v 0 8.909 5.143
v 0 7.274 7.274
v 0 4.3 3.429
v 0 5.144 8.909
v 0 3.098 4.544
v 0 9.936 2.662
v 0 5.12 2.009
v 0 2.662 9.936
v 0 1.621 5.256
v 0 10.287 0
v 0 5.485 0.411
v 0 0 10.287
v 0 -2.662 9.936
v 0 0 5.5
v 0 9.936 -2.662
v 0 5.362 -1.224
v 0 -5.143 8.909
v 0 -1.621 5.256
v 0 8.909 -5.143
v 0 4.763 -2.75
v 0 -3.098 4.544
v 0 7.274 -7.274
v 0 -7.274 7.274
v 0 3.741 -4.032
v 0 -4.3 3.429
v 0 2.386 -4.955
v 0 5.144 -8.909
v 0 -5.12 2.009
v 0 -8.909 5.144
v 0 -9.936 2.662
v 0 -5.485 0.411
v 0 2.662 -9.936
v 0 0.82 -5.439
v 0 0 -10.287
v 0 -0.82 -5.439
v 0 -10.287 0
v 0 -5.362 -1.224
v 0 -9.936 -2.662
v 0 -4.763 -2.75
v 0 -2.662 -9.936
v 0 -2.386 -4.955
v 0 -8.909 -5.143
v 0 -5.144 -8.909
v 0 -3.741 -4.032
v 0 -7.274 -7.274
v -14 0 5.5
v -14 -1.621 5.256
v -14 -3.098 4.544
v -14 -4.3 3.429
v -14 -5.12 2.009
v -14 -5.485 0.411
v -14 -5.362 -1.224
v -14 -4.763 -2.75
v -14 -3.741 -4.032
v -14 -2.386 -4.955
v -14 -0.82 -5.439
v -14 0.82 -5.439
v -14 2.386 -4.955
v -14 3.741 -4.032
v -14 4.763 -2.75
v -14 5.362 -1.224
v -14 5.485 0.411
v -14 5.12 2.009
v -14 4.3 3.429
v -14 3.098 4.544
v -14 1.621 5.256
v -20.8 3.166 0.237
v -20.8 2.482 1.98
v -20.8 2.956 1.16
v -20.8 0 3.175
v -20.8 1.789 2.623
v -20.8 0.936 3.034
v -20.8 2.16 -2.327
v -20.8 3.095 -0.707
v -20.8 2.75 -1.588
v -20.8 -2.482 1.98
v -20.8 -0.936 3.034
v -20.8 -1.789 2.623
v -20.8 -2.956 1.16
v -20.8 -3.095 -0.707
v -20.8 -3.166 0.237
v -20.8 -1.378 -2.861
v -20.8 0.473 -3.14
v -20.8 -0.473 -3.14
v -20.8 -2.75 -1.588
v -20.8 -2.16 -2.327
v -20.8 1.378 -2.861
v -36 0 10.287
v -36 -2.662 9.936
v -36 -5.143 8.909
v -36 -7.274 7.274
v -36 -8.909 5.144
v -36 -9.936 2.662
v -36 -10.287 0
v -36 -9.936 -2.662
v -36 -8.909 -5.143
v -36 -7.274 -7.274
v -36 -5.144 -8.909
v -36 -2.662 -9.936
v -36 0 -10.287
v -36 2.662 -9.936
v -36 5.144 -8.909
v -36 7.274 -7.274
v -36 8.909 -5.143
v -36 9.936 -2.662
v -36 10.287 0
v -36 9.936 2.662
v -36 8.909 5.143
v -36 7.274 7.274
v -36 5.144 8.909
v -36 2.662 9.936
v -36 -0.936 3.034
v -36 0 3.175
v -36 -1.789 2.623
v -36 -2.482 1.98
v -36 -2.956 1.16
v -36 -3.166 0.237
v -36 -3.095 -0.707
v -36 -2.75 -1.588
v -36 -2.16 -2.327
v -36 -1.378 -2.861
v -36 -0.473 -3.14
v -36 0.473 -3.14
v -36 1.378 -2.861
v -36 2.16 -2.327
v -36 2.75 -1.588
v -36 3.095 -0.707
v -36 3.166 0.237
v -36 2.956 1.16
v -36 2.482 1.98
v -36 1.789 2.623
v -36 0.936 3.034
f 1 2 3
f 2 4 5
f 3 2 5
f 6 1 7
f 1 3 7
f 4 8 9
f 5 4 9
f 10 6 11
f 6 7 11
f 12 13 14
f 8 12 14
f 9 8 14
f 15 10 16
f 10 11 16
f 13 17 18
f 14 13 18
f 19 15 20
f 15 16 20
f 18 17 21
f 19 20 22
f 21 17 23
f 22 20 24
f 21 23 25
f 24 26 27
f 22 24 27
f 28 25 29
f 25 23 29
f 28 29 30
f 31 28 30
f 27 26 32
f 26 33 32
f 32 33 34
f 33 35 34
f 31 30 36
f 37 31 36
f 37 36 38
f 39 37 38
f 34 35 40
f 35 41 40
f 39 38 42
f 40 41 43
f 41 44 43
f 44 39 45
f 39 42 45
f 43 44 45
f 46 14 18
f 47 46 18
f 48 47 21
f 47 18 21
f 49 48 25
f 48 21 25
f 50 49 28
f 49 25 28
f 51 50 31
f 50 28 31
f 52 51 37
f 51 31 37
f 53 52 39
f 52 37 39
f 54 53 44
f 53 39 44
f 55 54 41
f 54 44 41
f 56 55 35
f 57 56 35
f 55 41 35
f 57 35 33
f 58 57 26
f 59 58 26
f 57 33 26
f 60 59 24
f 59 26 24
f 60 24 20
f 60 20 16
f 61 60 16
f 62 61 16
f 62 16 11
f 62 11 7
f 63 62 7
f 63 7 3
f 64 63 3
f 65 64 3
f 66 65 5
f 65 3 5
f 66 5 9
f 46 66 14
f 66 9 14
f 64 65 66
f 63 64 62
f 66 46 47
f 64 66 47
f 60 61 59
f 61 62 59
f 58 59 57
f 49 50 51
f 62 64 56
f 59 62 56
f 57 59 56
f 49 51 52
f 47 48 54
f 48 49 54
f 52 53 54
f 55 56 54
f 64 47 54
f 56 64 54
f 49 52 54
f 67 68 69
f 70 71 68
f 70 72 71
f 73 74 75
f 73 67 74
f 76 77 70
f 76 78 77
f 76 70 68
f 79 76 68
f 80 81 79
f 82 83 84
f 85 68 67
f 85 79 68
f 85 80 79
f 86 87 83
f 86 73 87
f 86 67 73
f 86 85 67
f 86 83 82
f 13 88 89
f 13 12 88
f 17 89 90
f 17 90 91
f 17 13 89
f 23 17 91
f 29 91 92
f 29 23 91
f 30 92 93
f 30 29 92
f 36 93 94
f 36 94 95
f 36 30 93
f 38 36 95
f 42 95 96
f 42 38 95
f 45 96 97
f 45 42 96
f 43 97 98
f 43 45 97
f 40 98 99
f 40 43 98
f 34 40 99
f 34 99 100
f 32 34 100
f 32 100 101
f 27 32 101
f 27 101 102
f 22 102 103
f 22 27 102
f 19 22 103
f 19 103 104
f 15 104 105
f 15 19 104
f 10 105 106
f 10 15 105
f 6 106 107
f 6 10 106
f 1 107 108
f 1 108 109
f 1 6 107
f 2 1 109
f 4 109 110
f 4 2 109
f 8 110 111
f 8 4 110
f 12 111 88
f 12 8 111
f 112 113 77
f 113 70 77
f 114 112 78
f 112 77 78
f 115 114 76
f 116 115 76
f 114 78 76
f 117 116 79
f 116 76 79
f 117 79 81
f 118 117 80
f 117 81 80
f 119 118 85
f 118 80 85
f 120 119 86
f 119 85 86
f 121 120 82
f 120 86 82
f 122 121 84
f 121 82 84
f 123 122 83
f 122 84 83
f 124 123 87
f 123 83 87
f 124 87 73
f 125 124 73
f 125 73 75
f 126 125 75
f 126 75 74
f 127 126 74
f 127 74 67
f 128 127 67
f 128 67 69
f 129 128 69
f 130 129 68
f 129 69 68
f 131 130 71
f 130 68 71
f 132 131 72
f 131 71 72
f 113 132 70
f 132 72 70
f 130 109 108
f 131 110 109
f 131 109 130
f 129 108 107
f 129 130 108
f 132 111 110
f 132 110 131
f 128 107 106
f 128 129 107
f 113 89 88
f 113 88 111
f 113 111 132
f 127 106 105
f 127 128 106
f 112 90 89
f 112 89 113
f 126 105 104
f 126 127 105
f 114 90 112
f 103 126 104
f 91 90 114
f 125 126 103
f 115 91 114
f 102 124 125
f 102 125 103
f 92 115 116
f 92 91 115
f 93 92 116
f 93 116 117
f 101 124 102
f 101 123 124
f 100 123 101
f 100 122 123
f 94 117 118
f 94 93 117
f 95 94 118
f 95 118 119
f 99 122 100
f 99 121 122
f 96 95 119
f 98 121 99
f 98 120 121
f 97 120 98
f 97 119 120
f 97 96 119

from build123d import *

# Parameters (mm, degrees)
CONN_T4_FNPT_SKETCH_W = 36
CONN_T4_FNPT_SKETCH_H = 10.287
SOCKET_1_SKETCH_W     = 15
SOCKET_1_SKETCH_H     = 5.5
SOCKET_2_SKETCH_W     = 16.2
SOCKET_2_SKETCH_H     = 3.175


with BuildPart() as part:
    # Conn_T4_FNPT Sketch → Conn_T4_FNPT (revolve)
    with BuildSketch(Plane.XY):
        with Locations((-18, 5.1435)):
            Rectangle(CONN_T4_FNPT_SKETCH_W, CONN_T4_FNPT_SKETCH_H)
    revolve(axis=Axis((-1000, 0, 0), (1, 0, 0)))

    # Socket 1 Sketch → Socket 1 (revolve, cut)
    with BuildSketch(Plane.XY):
        with Locations((-6.5, 2.75)):
            Rectangle(SOCKET_1_SKETCH_W, SOCKET_1_SKETCH_H)
    revolve(axis=Axis((-1000, 0, 0), (1, 0, 0)), mode=Mode.SUBTRACT)

    # Socket 2 Sketch → Socket 2 (revolve, cut)
    with BuildSketch(Plane.XY):
        with Locations((-28.9, 1.5875)):
            Rectangle(SOCKET_2_SKETCH_W, SOCKET_2_SKETCH_H)
    revolve(axis=Axis((-1000, 0, 0), (1, 0, 0)), mode=Mode.SUBTRACT)


solid = part.part
